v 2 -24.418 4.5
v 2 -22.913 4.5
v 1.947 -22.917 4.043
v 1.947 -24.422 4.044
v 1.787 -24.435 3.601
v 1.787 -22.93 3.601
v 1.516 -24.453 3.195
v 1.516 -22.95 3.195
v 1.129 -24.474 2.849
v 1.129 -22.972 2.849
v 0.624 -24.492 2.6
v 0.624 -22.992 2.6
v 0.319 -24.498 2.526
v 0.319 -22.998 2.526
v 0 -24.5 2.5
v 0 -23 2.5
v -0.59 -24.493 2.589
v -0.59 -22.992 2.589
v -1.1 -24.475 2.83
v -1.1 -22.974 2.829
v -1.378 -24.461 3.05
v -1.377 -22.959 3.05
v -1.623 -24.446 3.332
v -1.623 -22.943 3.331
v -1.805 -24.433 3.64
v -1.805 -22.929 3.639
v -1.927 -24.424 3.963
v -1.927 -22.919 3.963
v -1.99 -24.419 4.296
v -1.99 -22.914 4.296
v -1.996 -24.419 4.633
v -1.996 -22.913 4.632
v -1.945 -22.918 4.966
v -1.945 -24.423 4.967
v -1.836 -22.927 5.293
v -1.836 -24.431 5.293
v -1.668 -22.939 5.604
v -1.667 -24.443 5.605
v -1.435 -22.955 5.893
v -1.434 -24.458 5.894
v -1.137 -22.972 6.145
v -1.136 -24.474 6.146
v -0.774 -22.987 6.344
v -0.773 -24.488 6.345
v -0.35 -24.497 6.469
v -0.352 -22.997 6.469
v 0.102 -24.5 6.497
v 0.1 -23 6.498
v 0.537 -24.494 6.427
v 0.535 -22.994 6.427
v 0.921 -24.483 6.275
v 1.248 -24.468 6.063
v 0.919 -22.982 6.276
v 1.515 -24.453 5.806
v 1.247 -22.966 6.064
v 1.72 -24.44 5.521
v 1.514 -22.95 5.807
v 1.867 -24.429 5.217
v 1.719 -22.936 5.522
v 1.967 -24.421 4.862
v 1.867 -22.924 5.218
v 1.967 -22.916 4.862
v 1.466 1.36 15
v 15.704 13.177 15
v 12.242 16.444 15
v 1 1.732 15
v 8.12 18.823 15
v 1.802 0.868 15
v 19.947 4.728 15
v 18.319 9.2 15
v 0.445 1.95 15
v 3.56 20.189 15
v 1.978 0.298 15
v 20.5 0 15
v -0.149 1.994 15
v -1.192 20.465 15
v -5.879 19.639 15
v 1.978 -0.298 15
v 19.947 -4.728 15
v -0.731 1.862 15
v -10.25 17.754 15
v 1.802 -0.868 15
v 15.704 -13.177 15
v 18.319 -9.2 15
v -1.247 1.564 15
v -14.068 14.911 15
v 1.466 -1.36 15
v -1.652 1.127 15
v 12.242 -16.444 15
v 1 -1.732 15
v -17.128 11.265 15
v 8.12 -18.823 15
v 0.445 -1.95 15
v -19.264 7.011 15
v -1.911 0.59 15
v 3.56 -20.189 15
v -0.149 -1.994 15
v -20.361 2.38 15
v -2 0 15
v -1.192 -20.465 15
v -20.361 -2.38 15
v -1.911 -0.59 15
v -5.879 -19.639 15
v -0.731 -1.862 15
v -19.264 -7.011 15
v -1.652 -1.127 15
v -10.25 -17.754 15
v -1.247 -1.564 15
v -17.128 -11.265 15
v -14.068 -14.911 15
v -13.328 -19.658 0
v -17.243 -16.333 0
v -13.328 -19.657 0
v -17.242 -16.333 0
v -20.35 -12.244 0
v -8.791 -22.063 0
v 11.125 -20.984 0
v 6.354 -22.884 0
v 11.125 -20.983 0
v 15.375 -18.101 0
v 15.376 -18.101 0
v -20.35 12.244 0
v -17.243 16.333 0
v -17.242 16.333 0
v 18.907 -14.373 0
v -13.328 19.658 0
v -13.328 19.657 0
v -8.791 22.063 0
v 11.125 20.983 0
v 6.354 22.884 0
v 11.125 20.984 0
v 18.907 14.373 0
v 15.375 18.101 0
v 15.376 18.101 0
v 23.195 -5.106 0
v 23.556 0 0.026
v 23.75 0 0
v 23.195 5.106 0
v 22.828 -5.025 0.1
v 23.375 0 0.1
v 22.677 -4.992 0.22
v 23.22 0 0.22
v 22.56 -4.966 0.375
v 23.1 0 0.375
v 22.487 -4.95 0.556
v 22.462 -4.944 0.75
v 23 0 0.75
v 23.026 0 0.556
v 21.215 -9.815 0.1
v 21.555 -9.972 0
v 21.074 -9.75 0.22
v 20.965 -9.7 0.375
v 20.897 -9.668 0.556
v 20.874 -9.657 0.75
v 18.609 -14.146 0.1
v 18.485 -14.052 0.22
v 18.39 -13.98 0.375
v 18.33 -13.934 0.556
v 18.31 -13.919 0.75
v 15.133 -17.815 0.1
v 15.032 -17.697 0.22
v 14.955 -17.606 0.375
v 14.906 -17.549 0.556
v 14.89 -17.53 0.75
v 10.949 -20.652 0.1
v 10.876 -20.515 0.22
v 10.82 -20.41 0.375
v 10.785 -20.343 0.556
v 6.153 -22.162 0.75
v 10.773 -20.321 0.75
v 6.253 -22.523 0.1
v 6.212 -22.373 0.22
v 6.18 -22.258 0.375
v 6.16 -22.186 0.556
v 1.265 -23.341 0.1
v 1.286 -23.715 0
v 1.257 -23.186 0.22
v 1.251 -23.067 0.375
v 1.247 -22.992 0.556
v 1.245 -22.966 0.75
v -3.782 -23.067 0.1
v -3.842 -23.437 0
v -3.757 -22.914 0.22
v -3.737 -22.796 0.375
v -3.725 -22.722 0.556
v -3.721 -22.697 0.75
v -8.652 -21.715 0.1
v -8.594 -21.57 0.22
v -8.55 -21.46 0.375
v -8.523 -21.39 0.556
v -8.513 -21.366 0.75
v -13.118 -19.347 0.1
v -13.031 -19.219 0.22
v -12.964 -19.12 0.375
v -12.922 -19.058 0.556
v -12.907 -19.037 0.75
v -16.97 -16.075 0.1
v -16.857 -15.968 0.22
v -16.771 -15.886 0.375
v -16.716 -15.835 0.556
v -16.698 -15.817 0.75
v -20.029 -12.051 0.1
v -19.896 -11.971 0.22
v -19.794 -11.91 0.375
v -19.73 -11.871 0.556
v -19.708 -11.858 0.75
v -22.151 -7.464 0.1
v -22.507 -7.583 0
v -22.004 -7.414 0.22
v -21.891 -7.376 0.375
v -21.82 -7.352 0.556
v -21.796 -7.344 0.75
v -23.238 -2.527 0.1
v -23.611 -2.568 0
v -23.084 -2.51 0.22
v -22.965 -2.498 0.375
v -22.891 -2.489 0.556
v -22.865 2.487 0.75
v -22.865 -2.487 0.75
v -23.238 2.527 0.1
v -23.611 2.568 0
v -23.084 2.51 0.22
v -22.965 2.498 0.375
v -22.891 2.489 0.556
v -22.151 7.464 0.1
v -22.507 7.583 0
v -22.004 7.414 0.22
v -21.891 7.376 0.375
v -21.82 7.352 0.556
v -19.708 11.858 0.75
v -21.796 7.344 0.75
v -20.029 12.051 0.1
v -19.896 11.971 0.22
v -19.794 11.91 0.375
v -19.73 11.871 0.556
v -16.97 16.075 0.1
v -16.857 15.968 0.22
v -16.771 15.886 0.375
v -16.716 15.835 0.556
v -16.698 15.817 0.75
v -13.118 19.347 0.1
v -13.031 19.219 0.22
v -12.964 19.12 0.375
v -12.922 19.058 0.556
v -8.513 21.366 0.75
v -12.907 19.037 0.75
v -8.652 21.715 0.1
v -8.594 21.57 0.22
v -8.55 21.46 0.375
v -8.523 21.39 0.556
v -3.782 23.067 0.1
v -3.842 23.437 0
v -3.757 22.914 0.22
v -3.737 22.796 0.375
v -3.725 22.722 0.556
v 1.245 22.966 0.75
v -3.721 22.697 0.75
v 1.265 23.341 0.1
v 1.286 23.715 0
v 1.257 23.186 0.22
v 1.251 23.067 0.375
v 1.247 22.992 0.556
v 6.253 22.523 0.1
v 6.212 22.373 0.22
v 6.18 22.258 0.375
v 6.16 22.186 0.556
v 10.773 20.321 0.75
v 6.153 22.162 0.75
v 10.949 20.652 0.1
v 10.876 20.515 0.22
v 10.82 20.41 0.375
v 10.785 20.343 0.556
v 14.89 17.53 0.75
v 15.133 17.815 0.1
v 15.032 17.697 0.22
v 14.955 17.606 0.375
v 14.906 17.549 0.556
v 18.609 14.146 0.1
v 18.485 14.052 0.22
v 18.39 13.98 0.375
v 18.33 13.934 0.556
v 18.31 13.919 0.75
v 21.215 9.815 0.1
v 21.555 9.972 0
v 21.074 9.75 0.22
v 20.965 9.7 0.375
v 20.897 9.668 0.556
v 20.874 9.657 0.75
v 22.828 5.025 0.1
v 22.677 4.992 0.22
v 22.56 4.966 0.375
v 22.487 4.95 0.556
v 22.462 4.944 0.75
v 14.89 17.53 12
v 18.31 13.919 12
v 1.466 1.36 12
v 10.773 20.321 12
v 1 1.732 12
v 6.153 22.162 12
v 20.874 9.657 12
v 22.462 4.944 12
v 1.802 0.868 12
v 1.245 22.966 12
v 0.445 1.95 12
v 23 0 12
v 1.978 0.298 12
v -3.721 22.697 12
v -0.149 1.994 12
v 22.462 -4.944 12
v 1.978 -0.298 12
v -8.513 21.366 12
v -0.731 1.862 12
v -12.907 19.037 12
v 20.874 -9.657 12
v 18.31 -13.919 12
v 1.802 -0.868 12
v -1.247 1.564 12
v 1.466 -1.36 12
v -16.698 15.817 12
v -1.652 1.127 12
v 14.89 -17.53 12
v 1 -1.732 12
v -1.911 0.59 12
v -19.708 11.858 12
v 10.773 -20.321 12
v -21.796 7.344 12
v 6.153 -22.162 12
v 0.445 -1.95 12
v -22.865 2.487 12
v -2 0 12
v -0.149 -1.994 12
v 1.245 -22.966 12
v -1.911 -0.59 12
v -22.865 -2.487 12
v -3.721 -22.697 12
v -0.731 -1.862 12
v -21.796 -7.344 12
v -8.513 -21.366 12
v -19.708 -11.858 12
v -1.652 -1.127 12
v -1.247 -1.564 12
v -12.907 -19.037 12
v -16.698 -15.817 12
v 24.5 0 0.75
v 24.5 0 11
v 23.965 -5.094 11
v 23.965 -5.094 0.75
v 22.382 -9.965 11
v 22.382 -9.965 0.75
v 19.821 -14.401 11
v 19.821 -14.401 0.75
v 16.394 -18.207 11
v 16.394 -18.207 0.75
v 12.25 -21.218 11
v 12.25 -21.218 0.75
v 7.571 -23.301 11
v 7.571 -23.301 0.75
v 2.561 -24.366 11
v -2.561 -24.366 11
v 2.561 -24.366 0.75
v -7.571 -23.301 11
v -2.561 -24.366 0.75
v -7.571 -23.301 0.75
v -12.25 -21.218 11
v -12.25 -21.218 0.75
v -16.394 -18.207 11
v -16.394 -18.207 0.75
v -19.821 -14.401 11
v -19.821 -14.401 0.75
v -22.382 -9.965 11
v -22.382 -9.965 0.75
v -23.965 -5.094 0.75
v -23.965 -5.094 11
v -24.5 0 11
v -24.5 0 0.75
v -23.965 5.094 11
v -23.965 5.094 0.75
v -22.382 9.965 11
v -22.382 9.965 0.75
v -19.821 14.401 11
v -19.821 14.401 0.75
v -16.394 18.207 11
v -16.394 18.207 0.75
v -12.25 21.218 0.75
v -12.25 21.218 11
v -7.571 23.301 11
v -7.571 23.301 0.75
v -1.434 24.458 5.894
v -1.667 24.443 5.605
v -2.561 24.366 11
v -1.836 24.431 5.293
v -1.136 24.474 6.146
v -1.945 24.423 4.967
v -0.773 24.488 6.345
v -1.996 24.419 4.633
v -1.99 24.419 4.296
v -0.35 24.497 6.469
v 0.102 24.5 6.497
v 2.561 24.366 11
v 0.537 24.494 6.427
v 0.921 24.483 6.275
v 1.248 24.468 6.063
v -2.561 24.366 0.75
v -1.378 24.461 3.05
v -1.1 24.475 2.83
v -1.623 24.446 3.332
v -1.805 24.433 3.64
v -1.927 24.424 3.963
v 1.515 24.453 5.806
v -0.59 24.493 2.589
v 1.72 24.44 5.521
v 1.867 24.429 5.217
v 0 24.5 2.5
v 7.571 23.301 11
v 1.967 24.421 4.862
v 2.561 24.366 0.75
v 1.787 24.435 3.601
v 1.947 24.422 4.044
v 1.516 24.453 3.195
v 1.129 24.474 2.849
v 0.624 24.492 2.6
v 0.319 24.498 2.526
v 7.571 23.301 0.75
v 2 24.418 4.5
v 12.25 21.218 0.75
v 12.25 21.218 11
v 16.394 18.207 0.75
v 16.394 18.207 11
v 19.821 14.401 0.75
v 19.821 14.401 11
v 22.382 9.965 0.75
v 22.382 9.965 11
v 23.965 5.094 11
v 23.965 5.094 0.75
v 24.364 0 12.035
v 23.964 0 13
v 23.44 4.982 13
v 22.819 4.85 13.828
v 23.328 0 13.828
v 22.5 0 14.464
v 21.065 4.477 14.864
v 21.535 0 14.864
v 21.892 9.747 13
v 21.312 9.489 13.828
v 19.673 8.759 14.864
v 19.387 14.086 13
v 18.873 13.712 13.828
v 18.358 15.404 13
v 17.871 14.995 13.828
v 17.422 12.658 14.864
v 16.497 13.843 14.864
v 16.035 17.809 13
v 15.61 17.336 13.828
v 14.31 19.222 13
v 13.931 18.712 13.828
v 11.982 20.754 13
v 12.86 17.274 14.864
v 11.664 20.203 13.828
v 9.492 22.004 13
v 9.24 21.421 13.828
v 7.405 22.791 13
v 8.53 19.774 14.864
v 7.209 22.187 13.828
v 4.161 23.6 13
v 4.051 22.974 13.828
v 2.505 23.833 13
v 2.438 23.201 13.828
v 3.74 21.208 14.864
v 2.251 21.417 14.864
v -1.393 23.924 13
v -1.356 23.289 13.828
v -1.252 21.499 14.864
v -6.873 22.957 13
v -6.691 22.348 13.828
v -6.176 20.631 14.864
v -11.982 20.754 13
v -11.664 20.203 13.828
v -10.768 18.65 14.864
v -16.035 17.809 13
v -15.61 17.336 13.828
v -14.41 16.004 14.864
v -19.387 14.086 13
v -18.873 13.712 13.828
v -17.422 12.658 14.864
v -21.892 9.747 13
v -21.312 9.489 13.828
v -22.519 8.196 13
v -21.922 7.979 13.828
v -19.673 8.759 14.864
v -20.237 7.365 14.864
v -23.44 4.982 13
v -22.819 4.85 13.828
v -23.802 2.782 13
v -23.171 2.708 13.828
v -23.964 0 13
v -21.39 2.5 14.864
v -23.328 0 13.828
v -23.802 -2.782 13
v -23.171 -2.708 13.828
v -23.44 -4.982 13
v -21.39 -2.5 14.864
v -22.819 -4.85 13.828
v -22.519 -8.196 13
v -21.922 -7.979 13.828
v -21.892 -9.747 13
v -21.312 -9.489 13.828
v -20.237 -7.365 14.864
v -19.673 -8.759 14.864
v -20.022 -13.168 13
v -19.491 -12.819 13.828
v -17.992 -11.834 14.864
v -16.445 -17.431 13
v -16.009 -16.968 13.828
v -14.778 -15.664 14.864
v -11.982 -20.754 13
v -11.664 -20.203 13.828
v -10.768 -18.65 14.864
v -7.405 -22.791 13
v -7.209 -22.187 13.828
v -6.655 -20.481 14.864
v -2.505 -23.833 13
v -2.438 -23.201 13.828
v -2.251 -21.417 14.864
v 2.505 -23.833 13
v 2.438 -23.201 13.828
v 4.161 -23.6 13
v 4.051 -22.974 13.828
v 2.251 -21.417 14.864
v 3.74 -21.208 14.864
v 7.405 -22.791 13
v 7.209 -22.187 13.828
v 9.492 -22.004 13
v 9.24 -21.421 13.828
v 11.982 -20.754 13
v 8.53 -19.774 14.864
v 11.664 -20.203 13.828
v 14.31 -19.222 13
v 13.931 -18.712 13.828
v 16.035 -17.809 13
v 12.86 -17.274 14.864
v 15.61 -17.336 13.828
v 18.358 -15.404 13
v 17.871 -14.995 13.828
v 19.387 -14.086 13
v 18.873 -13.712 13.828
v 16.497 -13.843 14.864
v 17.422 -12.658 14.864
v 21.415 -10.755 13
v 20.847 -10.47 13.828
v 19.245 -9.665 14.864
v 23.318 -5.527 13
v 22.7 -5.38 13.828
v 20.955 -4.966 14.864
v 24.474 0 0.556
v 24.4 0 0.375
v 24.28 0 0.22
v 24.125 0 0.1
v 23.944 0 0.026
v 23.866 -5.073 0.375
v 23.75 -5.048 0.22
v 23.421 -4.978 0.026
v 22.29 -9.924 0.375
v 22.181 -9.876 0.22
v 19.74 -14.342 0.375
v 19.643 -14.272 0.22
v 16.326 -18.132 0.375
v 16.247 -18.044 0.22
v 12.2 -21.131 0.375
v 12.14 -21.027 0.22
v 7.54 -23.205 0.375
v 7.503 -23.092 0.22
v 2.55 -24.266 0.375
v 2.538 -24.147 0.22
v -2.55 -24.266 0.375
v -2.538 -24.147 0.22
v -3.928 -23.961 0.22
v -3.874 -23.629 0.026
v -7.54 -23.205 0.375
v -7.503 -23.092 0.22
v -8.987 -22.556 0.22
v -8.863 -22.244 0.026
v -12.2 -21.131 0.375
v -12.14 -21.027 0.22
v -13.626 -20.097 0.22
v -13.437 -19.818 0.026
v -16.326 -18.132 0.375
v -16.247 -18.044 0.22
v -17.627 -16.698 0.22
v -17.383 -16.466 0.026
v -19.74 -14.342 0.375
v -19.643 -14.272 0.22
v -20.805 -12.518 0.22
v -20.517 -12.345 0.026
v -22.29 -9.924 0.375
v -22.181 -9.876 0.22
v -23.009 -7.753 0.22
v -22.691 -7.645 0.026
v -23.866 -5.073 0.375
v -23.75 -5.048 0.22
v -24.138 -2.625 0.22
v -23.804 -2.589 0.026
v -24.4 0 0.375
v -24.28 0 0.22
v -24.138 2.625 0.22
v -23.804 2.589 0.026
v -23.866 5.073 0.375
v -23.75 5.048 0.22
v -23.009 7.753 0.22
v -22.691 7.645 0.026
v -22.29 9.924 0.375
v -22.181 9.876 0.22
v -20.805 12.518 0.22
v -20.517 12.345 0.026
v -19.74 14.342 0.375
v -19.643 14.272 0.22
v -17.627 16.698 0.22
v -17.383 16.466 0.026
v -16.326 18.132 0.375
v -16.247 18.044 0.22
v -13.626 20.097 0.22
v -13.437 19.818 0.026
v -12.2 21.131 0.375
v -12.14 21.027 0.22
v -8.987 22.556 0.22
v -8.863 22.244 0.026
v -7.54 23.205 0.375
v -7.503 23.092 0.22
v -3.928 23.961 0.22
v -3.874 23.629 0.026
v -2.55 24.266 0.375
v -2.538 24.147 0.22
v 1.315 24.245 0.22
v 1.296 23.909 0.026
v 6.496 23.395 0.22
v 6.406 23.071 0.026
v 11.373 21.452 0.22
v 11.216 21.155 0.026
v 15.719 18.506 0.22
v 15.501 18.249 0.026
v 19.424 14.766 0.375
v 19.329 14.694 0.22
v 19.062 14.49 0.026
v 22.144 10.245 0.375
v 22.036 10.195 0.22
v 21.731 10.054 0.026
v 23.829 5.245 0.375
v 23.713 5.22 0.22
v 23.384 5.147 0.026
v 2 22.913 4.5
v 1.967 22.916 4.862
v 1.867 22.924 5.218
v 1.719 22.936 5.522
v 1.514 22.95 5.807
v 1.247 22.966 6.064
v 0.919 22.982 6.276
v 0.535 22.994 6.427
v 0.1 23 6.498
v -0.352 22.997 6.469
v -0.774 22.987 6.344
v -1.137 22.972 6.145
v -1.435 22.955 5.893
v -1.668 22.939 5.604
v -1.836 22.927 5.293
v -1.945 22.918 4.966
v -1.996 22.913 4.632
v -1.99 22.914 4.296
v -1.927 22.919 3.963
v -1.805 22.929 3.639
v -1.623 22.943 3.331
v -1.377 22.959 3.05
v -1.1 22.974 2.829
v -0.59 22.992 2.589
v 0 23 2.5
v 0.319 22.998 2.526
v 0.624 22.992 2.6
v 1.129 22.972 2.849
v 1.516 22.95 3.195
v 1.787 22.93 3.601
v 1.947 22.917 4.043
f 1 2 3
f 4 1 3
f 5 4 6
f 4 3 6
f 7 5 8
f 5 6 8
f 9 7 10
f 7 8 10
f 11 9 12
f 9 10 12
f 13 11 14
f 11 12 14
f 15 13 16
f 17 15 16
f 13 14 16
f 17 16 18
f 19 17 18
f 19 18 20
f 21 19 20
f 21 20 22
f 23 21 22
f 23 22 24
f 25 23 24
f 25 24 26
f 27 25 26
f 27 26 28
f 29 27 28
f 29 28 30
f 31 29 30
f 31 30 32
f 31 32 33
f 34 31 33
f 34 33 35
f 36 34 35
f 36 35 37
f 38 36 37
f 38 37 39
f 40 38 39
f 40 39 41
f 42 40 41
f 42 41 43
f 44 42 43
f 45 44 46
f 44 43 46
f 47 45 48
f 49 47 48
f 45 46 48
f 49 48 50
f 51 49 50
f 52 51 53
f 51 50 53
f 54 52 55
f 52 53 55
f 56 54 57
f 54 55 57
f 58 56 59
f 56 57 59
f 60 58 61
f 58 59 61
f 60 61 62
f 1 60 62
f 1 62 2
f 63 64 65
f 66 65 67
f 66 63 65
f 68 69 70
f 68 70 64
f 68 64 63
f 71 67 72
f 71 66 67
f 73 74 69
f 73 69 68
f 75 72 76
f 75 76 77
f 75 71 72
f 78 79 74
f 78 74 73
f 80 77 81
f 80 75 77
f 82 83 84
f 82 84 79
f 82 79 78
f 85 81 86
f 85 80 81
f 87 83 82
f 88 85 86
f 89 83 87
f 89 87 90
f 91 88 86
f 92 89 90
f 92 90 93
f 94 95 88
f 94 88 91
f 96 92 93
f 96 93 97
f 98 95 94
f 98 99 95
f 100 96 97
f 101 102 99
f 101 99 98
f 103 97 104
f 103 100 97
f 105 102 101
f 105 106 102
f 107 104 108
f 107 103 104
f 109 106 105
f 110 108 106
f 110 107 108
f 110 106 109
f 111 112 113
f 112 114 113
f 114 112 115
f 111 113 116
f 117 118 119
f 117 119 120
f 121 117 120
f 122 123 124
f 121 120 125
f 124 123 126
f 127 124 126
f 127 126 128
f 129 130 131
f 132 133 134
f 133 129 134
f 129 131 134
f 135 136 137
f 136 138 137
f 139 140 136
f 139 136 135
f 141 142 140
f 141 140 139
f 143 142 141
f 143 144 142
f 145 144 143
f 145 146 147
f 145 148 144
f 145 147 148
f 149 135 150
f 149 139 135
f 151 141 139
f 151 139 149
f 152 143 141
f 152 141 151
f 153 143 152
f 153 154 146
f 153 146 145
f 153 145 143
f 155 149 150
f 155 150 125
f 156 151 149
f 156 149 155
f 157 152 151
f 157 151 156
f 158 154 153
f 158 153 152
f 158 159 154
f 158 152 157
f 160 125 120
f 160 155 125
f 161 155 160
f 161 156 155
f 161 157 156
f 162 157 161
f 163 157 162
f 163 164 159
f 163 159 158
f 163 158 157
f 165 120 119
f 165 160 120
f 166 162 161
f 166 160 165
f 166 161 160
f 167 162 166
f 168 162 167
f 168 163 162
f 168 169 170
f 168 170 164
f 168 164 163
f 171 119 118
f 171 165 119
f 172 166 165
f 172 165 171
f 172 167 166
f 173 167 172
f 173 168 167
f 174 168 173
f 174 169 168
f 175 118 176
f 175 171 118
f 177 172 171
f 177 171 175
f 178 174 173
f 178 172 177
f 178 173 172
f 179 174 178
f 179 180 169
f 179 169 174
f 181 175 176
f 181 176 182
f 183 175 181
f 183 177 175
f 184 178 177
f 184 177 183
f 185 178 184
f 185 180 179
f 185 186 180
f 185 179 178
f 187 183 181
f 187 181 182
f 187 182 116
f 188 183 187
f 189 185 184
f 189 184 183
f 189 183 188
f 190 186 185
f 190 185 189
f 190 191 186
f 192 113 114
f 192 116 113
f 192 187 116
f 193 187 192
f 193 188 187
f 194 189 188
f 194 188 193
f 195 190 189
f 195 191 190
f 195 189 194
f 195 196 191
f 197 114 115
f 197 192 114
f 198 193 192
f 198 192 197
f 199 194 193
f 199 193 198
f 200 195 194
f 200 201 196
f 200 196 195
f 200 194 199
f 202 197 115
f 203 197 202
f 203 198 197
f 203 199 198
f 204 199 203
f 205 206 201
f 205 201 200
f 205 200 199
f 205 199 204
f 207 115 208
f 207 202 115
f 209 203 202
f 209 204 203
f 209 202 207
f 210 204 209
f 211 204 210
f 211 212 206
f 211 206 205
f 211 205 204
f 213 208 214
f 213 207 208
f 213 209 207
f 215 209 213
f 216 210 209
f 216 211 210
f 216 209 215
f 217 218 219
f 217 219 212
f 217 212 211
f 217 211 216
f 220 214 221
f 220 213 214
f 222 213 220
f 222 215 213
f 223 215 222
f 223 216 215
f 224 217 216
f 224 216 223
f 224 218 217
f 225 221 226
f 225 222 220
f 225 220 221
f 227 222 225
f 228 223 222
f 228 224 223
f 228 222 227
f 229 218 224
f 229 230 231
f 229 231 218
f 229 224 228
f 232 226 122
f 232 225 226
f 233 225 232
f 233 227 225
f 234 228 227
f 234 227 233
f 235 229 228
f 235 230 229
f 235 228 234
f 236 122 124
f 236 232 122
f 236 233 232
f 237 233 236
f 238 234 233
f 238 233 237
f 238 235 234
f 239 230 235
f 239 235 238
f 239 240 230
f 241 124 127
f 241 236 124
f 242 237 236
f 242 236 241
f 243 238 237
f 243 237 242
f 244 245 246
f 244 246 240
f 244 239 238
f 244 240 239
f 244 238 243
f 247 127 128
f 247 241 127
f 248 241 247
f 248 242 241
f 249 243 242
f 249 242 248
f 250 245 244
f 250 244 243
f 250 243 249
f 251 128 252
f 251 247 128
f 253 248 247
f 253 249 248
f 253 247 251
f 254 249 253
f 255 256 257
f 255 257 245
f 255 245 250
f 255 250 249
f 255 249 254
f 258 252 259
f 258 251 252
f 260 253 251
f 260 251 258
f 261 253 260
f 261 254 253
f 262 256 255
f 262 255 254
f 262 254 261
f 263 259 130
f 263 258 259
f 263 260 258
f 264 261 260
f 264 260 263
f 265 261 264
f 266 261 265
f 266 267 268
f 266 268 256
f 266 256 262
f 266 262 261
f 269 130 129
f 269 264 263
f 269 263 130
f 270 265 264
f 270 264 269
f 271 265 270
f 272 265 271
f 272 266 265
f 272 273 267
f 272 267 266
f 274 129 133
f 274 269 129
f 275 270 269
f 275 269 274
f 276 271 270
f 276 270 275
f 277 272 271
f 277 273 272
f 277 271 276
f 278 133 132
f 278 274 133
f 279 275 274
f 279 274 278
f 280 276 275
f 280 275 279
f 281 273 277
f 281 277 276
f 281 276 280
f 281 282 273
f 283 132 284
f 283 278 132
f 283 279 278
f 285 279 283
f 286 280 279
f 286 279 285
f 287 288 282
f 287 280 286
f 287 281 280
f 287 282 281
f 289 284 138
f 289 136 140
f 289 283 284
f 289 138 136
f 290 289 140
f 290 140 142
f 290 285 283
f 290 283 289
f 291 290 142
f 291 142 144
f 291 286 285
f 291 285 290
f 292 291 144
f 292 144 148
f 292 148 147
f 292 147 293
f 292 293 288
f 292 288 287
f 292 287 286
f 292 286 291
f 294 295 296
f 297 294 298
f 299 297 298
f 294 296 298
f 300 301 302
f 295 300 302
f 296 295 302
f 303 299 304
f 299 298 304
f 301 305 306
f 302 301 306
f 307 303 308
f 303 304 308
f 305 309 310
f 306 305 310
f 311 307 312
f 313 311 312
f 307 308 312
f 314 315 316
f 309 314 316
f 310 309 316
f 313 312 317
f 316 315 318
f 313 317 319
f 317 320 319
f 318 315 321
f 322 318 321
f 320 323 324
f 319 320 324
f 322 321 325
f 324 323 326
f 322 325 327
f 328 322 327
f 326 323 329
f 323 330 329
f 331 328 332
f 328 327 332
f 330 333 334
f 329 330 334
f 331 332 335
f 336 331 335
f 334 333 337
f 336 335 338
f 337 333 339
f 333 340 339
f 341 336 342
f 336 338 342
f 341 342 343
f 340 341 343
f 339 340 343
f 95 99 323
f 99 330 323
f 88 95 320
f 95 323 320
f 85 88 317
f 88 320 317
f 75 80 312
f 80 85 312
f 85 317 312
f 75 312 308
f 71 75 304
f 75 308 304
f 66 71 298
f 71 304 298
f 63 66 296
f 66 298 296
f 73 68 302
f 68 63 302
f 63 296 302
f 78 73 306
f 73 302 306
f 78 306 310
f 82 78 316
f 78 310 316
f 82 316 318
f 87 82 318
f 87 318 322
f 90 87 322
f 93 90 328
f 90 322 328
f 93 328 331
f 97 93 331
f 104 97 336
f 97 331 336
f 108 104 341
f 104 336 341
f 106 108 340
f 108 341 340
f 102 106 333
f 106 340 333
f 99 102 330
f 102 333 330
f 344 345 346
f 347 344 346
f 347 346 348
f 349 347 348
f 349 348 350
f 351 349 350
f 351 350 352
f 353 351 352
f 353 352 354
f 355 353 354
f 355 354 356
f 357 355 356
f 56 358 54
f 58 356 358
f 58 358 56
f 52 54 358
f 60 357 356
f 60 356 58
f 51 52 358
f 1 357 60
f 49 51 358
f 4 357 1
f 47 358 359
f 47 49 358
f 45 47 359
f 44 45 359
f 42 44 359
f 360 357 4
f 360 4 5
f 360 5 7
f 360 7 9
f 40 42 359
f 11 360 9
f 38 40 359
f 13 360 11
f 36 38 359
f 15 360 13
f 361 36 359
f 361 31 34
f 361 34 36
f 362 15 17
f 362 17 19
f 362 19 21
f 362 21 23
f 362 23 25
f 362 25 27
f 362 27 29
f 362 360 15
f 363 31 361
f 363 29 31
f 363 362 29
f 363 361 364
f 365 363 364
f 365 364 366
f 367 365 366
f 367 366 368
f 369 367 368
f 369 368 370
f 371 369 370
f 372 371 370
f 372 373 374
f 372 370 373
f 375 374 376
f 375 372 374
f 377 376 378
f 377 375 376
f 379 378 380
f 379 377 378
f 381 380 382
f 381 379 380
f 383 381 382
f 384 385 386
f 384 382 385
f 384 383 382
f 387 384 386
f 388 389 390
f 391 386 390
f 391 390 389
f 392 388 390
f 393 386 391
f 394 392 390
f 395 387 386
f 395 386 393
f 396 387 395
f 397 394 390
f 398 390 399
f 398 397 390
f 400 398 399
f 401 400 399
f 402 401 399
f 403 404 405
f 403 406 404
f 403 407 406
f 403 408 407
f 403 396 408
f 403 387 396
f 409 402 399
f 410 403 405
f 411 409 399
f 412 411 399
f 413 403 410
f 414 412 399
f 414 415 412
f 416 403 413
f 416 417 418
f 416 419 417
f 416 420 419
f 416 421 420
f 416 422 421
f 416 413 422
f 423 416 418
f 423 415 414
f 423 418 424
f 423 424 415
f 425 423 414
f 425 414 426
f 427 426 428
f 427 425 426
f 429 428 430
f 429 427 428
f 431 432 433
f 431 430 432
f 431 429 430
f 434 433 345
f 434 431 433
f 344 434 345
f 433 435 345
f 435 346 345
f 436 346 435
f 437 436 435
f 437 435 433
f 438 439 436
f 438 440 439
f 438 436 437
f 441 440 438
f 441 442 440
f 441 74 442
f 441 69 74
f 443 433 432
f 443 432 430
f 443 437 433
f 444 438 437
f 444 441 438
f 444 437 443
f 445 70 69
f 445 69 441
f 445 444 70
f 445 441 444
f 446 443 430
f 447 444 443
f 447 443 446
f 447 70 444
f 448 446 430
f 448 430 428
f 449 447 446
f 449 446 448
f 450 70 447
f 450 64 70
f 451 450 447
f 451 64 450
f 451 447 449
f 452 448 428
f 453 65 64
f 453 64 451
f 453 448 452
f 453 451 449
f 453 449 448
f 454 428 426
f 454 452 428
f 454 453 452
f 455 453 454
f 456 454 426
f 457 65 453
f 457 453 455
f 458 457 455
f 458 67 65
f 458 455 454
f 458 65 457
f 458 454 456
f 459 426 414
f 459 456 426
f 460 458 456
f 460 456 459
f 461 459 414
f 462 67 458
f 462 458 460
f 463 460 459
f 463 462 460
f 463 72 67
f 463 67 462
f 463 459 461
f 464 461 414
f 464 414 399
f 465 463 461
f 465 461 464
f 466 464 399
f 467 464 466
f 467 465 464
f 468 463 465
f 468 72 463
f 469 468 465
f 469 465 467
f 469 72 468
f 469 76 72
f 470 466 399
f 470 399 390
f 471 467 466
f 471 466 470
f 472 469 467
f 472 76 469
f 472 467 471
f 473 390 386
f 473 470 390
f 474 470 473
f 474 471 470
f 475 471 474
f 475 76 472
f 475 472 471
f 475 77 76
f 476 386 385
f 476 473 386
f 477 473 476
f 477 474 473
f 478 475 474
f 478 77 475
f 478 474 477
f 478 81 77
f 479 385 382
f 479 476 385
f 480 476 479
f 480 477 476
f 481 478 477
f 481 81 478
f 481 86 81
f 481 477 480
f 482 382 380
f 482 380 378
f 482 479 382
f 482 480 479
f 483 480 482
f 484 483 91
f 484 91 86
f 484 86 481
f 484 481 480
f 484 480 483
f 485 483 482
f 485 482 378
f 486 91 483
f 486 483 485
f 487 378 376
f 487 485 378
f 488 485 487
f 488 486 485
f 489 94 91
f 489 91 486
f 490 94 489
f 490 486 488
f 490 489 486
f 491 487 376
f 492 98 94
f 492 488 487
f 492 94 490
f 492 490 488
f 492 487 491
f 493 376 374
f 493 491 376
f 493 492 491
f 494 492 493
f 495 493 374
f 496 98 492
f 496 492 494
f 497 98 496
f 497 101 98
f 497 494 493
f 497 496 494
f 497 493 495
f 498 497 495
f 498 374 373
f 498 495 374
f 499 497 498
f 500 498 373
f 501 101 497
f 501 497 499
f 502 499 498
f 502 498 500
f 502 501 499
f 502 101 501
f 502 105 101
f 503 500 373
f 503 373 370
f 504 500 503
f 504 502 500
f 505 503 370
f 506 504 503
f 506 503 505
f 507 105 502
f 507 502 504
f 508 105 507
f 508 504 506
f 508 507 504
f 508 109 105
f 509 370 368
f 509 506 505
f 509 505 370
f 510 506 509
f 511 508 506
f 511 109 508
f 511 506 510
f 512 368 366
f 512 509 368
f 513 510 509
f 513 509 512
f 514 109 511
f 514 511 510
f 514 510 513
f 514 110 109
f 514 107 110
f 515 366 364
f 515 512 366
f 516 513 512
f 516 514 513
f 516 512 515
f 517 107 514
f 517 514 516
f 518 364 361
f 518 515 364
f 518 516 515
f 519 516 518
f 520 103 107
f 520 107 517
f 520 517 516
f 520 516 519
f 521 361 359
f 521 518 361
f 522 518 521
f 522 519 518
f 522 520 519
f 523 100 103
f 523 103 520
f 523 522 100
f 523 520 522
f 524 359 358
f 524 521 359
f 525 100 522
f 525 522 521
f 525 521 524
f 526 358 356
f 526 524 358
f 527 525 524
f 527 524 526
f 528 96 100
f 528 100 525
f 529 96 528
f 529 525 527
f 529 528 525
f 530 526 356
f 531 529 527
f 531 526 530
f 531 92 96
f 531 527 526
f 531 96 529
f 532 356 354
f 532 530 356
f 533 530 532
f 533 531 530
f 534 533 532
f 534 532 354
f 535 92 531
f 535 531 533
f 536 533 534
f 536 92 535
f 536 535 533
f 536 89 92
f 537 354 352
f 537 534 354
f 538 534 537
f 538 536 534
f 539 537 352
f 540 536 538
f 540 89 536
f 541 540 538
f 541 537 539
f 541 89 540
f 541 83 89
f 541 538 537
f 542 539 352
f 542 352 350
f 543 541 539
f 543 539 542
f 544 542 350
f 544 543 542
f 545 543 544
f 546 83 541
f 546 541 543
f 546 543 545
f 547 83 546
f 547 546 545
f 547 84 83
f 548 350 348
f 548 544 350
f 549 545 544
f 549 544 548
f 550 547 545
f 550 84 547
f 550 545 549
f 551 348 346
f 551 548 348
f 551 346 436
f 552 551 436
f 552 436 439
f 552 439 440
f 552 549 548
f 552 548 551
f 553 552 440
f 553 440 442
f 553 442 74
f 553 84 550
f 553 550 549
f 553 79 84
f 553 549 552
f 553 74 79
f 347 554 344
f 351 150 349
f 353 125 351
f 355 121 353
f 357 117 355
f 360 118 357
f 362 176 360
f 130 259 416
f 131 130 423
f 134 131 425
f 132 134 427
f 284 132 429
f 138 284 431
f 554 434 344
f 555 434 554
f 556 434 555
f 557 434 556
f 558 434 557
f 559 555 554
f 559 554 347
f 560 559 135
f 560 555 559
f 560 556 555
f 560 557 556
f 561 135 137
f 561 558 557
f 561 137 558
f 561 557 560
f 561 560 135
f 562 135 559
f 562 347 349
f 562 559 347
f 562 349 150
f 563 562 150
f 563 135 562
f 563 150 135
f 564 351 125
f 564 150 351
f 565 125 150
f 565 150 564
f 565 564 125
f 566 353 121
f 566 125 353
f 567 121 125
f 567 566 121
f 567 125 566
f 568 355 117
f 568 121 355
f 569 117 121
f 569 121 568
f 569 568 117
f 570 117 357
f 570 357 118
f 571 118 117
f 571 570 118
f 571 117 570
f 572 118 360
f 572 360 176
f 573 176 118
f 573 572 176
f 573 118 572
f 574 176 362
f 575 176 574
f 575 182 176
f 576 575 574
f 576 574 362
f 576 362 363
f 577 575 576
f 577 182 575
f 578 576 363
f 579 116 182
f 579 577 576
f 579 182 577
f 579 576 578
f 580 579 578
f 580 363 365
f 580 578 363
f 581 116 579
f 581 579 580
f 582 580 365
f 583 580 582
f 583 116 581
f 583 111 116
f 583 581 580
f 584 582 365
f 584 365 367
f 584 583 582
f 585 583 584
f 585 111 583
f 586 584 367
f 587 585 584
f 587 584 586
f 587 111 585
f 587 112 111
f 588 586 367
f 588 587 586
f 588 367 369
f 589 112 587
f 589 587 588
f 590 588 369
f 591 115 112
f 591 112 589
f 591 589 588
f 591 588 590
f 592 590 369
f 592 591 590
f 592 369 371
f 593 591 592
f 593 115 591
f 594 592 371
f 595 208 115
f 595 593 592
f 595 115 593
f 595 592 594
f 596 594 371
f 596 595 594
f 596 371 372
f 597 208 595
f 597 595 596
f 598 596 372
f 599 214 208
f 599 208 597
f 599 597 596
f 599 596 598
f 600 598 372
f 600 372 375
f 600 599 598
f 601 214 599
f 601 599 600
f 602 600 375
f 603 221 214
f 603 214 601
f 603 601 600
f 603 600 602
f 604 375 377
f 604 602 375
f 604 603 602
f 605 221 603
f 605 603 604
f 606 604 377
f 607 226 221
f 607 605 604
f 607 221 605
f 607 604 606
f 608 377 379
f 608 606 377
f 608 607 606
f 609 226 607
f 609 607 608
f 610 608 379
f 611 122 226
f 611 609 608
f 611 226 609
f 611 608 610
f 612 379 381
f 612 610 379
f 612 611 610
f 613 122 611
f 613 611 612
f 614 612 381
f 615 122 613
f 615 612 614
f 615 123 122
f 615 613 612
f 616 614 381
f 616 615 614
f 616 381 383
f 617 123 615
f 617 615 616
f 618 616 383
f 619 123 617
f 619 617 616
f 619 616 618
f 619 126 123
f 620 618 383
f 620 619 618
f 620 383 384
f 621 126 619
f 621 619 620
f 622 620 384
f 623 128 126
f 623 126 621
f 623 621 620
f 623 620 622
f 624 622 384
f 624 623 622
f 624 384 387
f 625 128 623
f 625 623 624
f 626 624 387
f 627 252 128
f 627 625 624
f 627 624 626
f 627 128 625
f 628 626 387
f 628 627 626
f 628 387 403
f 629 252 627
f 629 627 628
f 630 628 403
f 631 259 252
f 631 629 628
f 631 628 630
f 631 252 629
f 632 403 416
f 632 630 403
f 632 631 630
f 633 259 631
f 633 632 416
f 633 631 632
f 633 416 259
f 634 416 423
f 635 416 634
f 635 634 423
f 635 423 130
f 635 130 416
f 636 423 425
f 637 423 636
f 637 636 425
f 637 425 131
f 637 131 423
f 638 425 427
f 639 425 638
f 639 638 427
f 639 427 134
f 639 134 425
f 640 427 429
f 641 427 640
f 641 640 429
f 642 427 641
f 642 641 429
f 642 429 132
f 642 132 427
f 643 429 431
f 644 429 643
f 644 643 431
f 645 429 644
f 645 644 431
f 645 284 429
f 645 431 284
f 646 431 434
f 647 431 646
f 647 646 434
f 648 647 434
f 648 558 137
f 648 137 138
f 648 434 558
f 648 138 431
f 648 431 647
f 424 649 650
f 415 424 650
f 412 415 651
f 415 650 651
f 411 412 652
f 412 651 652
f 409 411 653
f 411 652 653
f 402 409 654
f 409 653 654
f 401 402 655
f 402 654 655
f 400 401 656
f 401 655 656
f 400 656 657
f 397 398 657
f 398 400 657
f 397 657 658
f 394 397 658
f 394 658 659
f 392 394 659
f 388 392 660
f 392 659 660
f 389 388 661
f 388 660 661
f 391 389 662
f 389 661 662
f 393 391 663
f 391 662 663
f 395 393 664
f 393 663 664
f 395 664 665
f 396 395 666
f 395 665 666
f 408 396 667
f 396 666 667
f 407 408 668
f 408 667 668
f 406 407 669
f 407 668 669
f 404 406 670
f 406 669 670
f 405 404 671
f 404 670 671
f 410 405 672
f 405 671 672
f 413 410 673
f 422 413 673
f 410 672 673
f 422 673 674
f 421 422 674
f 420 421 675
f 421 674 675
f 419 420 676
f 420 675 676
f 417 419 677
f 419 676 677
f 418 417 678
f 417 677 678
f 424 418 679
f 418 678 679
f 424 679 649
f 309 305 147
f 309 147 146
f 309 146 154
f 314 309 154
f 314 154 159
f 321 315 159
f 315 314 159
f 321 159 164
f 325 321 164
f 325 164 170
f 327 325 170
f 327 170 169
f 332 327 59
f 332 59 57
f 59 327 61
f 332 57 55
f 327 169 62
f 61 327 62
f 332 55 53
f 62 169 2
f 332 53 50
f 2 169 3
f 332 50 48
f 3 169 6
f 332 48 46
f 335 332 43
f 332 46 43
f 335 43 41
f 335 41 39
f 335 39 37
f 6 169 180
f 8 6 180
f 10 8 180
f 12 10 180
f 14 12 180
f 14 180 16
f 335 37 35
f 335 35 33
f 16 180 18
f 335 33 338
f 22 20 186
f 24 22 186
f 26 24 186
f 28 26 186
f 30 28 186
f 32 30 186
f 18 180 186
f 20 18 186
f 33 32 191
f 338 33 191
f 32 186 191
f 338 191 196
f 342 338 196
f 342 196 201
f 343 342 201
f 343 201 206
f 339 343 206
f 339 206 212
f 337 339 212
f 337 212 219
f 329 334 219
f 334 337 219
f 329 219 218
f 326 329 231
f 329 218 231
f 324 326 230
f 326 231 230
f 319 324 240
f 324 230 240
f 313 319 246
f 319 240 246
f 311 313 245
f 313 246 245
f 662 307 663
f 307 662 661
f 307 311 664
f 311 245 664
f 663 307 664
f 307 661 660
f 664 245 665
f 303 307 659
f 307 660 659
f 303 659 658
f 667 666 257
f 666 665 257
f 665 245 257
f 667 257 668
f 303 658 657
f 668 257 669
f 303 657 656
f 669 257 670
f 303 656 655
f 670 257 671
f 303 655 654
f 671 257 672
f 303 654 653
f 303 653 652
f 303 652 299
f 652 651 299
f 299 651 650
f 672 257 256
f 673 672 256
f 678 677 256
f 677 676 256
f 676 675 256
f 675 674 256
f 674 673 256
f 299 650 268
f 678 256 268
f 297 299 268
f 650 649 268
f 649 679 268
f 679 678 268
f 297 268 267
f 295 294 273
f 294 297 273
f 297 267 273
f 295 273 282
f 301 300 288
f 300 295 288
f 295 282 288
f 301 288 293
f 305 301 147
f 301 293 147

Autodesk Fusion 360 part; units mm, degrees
sketch "Sketch1" plane through (0, 0, 0) normal (0, 0, 1) x (1, 0, 0)
  circle A0 centre (0, 0) radius 23
  circle A1 centre (0, 0) radius 24.5
  dimension "d1" = 46
  dimension "d2" = 49
extrude "Extrude1" add sketch "Sketch1" along normal blind 12
sketch "Sketch2" plane through (0, 0, 12) normal (0, 0, 1) x (-1, 0, 0)
  circle A0 centre (0, 0) radius 23
  circle A1 centre (0, 0) radius 24.5
  circle A2 centre (0, 0) radius 2
  circle A3 centre (0, 0) radius 24.5
  dimension "d5" = 4
extrude "Extrude2" add sketch "Sketch2" along normal blind 3 contours A0 | A1 A3
fillet "Fillet1" radius 4 1 edges at (22.842, 8.8596, 15)
sketch "Sketch3" plane through (0, 0, 0) normal (0, 1, 0) x (1, 0, 0)
  line L0 (0, 0) -> (0, -4.5)
  circle A0 centre (0, -4.5) radius 2
  dimension "d10" = 4.5
  dimension "d11" = 4
extrude "Extrude3" cut sketch "Sketch3" along normal mid plane 700
fillet "Fillet2" radius 0.75 2 edges at (-22.842, -8.8596, 0) (-21.4435, 8.3172, 0)
